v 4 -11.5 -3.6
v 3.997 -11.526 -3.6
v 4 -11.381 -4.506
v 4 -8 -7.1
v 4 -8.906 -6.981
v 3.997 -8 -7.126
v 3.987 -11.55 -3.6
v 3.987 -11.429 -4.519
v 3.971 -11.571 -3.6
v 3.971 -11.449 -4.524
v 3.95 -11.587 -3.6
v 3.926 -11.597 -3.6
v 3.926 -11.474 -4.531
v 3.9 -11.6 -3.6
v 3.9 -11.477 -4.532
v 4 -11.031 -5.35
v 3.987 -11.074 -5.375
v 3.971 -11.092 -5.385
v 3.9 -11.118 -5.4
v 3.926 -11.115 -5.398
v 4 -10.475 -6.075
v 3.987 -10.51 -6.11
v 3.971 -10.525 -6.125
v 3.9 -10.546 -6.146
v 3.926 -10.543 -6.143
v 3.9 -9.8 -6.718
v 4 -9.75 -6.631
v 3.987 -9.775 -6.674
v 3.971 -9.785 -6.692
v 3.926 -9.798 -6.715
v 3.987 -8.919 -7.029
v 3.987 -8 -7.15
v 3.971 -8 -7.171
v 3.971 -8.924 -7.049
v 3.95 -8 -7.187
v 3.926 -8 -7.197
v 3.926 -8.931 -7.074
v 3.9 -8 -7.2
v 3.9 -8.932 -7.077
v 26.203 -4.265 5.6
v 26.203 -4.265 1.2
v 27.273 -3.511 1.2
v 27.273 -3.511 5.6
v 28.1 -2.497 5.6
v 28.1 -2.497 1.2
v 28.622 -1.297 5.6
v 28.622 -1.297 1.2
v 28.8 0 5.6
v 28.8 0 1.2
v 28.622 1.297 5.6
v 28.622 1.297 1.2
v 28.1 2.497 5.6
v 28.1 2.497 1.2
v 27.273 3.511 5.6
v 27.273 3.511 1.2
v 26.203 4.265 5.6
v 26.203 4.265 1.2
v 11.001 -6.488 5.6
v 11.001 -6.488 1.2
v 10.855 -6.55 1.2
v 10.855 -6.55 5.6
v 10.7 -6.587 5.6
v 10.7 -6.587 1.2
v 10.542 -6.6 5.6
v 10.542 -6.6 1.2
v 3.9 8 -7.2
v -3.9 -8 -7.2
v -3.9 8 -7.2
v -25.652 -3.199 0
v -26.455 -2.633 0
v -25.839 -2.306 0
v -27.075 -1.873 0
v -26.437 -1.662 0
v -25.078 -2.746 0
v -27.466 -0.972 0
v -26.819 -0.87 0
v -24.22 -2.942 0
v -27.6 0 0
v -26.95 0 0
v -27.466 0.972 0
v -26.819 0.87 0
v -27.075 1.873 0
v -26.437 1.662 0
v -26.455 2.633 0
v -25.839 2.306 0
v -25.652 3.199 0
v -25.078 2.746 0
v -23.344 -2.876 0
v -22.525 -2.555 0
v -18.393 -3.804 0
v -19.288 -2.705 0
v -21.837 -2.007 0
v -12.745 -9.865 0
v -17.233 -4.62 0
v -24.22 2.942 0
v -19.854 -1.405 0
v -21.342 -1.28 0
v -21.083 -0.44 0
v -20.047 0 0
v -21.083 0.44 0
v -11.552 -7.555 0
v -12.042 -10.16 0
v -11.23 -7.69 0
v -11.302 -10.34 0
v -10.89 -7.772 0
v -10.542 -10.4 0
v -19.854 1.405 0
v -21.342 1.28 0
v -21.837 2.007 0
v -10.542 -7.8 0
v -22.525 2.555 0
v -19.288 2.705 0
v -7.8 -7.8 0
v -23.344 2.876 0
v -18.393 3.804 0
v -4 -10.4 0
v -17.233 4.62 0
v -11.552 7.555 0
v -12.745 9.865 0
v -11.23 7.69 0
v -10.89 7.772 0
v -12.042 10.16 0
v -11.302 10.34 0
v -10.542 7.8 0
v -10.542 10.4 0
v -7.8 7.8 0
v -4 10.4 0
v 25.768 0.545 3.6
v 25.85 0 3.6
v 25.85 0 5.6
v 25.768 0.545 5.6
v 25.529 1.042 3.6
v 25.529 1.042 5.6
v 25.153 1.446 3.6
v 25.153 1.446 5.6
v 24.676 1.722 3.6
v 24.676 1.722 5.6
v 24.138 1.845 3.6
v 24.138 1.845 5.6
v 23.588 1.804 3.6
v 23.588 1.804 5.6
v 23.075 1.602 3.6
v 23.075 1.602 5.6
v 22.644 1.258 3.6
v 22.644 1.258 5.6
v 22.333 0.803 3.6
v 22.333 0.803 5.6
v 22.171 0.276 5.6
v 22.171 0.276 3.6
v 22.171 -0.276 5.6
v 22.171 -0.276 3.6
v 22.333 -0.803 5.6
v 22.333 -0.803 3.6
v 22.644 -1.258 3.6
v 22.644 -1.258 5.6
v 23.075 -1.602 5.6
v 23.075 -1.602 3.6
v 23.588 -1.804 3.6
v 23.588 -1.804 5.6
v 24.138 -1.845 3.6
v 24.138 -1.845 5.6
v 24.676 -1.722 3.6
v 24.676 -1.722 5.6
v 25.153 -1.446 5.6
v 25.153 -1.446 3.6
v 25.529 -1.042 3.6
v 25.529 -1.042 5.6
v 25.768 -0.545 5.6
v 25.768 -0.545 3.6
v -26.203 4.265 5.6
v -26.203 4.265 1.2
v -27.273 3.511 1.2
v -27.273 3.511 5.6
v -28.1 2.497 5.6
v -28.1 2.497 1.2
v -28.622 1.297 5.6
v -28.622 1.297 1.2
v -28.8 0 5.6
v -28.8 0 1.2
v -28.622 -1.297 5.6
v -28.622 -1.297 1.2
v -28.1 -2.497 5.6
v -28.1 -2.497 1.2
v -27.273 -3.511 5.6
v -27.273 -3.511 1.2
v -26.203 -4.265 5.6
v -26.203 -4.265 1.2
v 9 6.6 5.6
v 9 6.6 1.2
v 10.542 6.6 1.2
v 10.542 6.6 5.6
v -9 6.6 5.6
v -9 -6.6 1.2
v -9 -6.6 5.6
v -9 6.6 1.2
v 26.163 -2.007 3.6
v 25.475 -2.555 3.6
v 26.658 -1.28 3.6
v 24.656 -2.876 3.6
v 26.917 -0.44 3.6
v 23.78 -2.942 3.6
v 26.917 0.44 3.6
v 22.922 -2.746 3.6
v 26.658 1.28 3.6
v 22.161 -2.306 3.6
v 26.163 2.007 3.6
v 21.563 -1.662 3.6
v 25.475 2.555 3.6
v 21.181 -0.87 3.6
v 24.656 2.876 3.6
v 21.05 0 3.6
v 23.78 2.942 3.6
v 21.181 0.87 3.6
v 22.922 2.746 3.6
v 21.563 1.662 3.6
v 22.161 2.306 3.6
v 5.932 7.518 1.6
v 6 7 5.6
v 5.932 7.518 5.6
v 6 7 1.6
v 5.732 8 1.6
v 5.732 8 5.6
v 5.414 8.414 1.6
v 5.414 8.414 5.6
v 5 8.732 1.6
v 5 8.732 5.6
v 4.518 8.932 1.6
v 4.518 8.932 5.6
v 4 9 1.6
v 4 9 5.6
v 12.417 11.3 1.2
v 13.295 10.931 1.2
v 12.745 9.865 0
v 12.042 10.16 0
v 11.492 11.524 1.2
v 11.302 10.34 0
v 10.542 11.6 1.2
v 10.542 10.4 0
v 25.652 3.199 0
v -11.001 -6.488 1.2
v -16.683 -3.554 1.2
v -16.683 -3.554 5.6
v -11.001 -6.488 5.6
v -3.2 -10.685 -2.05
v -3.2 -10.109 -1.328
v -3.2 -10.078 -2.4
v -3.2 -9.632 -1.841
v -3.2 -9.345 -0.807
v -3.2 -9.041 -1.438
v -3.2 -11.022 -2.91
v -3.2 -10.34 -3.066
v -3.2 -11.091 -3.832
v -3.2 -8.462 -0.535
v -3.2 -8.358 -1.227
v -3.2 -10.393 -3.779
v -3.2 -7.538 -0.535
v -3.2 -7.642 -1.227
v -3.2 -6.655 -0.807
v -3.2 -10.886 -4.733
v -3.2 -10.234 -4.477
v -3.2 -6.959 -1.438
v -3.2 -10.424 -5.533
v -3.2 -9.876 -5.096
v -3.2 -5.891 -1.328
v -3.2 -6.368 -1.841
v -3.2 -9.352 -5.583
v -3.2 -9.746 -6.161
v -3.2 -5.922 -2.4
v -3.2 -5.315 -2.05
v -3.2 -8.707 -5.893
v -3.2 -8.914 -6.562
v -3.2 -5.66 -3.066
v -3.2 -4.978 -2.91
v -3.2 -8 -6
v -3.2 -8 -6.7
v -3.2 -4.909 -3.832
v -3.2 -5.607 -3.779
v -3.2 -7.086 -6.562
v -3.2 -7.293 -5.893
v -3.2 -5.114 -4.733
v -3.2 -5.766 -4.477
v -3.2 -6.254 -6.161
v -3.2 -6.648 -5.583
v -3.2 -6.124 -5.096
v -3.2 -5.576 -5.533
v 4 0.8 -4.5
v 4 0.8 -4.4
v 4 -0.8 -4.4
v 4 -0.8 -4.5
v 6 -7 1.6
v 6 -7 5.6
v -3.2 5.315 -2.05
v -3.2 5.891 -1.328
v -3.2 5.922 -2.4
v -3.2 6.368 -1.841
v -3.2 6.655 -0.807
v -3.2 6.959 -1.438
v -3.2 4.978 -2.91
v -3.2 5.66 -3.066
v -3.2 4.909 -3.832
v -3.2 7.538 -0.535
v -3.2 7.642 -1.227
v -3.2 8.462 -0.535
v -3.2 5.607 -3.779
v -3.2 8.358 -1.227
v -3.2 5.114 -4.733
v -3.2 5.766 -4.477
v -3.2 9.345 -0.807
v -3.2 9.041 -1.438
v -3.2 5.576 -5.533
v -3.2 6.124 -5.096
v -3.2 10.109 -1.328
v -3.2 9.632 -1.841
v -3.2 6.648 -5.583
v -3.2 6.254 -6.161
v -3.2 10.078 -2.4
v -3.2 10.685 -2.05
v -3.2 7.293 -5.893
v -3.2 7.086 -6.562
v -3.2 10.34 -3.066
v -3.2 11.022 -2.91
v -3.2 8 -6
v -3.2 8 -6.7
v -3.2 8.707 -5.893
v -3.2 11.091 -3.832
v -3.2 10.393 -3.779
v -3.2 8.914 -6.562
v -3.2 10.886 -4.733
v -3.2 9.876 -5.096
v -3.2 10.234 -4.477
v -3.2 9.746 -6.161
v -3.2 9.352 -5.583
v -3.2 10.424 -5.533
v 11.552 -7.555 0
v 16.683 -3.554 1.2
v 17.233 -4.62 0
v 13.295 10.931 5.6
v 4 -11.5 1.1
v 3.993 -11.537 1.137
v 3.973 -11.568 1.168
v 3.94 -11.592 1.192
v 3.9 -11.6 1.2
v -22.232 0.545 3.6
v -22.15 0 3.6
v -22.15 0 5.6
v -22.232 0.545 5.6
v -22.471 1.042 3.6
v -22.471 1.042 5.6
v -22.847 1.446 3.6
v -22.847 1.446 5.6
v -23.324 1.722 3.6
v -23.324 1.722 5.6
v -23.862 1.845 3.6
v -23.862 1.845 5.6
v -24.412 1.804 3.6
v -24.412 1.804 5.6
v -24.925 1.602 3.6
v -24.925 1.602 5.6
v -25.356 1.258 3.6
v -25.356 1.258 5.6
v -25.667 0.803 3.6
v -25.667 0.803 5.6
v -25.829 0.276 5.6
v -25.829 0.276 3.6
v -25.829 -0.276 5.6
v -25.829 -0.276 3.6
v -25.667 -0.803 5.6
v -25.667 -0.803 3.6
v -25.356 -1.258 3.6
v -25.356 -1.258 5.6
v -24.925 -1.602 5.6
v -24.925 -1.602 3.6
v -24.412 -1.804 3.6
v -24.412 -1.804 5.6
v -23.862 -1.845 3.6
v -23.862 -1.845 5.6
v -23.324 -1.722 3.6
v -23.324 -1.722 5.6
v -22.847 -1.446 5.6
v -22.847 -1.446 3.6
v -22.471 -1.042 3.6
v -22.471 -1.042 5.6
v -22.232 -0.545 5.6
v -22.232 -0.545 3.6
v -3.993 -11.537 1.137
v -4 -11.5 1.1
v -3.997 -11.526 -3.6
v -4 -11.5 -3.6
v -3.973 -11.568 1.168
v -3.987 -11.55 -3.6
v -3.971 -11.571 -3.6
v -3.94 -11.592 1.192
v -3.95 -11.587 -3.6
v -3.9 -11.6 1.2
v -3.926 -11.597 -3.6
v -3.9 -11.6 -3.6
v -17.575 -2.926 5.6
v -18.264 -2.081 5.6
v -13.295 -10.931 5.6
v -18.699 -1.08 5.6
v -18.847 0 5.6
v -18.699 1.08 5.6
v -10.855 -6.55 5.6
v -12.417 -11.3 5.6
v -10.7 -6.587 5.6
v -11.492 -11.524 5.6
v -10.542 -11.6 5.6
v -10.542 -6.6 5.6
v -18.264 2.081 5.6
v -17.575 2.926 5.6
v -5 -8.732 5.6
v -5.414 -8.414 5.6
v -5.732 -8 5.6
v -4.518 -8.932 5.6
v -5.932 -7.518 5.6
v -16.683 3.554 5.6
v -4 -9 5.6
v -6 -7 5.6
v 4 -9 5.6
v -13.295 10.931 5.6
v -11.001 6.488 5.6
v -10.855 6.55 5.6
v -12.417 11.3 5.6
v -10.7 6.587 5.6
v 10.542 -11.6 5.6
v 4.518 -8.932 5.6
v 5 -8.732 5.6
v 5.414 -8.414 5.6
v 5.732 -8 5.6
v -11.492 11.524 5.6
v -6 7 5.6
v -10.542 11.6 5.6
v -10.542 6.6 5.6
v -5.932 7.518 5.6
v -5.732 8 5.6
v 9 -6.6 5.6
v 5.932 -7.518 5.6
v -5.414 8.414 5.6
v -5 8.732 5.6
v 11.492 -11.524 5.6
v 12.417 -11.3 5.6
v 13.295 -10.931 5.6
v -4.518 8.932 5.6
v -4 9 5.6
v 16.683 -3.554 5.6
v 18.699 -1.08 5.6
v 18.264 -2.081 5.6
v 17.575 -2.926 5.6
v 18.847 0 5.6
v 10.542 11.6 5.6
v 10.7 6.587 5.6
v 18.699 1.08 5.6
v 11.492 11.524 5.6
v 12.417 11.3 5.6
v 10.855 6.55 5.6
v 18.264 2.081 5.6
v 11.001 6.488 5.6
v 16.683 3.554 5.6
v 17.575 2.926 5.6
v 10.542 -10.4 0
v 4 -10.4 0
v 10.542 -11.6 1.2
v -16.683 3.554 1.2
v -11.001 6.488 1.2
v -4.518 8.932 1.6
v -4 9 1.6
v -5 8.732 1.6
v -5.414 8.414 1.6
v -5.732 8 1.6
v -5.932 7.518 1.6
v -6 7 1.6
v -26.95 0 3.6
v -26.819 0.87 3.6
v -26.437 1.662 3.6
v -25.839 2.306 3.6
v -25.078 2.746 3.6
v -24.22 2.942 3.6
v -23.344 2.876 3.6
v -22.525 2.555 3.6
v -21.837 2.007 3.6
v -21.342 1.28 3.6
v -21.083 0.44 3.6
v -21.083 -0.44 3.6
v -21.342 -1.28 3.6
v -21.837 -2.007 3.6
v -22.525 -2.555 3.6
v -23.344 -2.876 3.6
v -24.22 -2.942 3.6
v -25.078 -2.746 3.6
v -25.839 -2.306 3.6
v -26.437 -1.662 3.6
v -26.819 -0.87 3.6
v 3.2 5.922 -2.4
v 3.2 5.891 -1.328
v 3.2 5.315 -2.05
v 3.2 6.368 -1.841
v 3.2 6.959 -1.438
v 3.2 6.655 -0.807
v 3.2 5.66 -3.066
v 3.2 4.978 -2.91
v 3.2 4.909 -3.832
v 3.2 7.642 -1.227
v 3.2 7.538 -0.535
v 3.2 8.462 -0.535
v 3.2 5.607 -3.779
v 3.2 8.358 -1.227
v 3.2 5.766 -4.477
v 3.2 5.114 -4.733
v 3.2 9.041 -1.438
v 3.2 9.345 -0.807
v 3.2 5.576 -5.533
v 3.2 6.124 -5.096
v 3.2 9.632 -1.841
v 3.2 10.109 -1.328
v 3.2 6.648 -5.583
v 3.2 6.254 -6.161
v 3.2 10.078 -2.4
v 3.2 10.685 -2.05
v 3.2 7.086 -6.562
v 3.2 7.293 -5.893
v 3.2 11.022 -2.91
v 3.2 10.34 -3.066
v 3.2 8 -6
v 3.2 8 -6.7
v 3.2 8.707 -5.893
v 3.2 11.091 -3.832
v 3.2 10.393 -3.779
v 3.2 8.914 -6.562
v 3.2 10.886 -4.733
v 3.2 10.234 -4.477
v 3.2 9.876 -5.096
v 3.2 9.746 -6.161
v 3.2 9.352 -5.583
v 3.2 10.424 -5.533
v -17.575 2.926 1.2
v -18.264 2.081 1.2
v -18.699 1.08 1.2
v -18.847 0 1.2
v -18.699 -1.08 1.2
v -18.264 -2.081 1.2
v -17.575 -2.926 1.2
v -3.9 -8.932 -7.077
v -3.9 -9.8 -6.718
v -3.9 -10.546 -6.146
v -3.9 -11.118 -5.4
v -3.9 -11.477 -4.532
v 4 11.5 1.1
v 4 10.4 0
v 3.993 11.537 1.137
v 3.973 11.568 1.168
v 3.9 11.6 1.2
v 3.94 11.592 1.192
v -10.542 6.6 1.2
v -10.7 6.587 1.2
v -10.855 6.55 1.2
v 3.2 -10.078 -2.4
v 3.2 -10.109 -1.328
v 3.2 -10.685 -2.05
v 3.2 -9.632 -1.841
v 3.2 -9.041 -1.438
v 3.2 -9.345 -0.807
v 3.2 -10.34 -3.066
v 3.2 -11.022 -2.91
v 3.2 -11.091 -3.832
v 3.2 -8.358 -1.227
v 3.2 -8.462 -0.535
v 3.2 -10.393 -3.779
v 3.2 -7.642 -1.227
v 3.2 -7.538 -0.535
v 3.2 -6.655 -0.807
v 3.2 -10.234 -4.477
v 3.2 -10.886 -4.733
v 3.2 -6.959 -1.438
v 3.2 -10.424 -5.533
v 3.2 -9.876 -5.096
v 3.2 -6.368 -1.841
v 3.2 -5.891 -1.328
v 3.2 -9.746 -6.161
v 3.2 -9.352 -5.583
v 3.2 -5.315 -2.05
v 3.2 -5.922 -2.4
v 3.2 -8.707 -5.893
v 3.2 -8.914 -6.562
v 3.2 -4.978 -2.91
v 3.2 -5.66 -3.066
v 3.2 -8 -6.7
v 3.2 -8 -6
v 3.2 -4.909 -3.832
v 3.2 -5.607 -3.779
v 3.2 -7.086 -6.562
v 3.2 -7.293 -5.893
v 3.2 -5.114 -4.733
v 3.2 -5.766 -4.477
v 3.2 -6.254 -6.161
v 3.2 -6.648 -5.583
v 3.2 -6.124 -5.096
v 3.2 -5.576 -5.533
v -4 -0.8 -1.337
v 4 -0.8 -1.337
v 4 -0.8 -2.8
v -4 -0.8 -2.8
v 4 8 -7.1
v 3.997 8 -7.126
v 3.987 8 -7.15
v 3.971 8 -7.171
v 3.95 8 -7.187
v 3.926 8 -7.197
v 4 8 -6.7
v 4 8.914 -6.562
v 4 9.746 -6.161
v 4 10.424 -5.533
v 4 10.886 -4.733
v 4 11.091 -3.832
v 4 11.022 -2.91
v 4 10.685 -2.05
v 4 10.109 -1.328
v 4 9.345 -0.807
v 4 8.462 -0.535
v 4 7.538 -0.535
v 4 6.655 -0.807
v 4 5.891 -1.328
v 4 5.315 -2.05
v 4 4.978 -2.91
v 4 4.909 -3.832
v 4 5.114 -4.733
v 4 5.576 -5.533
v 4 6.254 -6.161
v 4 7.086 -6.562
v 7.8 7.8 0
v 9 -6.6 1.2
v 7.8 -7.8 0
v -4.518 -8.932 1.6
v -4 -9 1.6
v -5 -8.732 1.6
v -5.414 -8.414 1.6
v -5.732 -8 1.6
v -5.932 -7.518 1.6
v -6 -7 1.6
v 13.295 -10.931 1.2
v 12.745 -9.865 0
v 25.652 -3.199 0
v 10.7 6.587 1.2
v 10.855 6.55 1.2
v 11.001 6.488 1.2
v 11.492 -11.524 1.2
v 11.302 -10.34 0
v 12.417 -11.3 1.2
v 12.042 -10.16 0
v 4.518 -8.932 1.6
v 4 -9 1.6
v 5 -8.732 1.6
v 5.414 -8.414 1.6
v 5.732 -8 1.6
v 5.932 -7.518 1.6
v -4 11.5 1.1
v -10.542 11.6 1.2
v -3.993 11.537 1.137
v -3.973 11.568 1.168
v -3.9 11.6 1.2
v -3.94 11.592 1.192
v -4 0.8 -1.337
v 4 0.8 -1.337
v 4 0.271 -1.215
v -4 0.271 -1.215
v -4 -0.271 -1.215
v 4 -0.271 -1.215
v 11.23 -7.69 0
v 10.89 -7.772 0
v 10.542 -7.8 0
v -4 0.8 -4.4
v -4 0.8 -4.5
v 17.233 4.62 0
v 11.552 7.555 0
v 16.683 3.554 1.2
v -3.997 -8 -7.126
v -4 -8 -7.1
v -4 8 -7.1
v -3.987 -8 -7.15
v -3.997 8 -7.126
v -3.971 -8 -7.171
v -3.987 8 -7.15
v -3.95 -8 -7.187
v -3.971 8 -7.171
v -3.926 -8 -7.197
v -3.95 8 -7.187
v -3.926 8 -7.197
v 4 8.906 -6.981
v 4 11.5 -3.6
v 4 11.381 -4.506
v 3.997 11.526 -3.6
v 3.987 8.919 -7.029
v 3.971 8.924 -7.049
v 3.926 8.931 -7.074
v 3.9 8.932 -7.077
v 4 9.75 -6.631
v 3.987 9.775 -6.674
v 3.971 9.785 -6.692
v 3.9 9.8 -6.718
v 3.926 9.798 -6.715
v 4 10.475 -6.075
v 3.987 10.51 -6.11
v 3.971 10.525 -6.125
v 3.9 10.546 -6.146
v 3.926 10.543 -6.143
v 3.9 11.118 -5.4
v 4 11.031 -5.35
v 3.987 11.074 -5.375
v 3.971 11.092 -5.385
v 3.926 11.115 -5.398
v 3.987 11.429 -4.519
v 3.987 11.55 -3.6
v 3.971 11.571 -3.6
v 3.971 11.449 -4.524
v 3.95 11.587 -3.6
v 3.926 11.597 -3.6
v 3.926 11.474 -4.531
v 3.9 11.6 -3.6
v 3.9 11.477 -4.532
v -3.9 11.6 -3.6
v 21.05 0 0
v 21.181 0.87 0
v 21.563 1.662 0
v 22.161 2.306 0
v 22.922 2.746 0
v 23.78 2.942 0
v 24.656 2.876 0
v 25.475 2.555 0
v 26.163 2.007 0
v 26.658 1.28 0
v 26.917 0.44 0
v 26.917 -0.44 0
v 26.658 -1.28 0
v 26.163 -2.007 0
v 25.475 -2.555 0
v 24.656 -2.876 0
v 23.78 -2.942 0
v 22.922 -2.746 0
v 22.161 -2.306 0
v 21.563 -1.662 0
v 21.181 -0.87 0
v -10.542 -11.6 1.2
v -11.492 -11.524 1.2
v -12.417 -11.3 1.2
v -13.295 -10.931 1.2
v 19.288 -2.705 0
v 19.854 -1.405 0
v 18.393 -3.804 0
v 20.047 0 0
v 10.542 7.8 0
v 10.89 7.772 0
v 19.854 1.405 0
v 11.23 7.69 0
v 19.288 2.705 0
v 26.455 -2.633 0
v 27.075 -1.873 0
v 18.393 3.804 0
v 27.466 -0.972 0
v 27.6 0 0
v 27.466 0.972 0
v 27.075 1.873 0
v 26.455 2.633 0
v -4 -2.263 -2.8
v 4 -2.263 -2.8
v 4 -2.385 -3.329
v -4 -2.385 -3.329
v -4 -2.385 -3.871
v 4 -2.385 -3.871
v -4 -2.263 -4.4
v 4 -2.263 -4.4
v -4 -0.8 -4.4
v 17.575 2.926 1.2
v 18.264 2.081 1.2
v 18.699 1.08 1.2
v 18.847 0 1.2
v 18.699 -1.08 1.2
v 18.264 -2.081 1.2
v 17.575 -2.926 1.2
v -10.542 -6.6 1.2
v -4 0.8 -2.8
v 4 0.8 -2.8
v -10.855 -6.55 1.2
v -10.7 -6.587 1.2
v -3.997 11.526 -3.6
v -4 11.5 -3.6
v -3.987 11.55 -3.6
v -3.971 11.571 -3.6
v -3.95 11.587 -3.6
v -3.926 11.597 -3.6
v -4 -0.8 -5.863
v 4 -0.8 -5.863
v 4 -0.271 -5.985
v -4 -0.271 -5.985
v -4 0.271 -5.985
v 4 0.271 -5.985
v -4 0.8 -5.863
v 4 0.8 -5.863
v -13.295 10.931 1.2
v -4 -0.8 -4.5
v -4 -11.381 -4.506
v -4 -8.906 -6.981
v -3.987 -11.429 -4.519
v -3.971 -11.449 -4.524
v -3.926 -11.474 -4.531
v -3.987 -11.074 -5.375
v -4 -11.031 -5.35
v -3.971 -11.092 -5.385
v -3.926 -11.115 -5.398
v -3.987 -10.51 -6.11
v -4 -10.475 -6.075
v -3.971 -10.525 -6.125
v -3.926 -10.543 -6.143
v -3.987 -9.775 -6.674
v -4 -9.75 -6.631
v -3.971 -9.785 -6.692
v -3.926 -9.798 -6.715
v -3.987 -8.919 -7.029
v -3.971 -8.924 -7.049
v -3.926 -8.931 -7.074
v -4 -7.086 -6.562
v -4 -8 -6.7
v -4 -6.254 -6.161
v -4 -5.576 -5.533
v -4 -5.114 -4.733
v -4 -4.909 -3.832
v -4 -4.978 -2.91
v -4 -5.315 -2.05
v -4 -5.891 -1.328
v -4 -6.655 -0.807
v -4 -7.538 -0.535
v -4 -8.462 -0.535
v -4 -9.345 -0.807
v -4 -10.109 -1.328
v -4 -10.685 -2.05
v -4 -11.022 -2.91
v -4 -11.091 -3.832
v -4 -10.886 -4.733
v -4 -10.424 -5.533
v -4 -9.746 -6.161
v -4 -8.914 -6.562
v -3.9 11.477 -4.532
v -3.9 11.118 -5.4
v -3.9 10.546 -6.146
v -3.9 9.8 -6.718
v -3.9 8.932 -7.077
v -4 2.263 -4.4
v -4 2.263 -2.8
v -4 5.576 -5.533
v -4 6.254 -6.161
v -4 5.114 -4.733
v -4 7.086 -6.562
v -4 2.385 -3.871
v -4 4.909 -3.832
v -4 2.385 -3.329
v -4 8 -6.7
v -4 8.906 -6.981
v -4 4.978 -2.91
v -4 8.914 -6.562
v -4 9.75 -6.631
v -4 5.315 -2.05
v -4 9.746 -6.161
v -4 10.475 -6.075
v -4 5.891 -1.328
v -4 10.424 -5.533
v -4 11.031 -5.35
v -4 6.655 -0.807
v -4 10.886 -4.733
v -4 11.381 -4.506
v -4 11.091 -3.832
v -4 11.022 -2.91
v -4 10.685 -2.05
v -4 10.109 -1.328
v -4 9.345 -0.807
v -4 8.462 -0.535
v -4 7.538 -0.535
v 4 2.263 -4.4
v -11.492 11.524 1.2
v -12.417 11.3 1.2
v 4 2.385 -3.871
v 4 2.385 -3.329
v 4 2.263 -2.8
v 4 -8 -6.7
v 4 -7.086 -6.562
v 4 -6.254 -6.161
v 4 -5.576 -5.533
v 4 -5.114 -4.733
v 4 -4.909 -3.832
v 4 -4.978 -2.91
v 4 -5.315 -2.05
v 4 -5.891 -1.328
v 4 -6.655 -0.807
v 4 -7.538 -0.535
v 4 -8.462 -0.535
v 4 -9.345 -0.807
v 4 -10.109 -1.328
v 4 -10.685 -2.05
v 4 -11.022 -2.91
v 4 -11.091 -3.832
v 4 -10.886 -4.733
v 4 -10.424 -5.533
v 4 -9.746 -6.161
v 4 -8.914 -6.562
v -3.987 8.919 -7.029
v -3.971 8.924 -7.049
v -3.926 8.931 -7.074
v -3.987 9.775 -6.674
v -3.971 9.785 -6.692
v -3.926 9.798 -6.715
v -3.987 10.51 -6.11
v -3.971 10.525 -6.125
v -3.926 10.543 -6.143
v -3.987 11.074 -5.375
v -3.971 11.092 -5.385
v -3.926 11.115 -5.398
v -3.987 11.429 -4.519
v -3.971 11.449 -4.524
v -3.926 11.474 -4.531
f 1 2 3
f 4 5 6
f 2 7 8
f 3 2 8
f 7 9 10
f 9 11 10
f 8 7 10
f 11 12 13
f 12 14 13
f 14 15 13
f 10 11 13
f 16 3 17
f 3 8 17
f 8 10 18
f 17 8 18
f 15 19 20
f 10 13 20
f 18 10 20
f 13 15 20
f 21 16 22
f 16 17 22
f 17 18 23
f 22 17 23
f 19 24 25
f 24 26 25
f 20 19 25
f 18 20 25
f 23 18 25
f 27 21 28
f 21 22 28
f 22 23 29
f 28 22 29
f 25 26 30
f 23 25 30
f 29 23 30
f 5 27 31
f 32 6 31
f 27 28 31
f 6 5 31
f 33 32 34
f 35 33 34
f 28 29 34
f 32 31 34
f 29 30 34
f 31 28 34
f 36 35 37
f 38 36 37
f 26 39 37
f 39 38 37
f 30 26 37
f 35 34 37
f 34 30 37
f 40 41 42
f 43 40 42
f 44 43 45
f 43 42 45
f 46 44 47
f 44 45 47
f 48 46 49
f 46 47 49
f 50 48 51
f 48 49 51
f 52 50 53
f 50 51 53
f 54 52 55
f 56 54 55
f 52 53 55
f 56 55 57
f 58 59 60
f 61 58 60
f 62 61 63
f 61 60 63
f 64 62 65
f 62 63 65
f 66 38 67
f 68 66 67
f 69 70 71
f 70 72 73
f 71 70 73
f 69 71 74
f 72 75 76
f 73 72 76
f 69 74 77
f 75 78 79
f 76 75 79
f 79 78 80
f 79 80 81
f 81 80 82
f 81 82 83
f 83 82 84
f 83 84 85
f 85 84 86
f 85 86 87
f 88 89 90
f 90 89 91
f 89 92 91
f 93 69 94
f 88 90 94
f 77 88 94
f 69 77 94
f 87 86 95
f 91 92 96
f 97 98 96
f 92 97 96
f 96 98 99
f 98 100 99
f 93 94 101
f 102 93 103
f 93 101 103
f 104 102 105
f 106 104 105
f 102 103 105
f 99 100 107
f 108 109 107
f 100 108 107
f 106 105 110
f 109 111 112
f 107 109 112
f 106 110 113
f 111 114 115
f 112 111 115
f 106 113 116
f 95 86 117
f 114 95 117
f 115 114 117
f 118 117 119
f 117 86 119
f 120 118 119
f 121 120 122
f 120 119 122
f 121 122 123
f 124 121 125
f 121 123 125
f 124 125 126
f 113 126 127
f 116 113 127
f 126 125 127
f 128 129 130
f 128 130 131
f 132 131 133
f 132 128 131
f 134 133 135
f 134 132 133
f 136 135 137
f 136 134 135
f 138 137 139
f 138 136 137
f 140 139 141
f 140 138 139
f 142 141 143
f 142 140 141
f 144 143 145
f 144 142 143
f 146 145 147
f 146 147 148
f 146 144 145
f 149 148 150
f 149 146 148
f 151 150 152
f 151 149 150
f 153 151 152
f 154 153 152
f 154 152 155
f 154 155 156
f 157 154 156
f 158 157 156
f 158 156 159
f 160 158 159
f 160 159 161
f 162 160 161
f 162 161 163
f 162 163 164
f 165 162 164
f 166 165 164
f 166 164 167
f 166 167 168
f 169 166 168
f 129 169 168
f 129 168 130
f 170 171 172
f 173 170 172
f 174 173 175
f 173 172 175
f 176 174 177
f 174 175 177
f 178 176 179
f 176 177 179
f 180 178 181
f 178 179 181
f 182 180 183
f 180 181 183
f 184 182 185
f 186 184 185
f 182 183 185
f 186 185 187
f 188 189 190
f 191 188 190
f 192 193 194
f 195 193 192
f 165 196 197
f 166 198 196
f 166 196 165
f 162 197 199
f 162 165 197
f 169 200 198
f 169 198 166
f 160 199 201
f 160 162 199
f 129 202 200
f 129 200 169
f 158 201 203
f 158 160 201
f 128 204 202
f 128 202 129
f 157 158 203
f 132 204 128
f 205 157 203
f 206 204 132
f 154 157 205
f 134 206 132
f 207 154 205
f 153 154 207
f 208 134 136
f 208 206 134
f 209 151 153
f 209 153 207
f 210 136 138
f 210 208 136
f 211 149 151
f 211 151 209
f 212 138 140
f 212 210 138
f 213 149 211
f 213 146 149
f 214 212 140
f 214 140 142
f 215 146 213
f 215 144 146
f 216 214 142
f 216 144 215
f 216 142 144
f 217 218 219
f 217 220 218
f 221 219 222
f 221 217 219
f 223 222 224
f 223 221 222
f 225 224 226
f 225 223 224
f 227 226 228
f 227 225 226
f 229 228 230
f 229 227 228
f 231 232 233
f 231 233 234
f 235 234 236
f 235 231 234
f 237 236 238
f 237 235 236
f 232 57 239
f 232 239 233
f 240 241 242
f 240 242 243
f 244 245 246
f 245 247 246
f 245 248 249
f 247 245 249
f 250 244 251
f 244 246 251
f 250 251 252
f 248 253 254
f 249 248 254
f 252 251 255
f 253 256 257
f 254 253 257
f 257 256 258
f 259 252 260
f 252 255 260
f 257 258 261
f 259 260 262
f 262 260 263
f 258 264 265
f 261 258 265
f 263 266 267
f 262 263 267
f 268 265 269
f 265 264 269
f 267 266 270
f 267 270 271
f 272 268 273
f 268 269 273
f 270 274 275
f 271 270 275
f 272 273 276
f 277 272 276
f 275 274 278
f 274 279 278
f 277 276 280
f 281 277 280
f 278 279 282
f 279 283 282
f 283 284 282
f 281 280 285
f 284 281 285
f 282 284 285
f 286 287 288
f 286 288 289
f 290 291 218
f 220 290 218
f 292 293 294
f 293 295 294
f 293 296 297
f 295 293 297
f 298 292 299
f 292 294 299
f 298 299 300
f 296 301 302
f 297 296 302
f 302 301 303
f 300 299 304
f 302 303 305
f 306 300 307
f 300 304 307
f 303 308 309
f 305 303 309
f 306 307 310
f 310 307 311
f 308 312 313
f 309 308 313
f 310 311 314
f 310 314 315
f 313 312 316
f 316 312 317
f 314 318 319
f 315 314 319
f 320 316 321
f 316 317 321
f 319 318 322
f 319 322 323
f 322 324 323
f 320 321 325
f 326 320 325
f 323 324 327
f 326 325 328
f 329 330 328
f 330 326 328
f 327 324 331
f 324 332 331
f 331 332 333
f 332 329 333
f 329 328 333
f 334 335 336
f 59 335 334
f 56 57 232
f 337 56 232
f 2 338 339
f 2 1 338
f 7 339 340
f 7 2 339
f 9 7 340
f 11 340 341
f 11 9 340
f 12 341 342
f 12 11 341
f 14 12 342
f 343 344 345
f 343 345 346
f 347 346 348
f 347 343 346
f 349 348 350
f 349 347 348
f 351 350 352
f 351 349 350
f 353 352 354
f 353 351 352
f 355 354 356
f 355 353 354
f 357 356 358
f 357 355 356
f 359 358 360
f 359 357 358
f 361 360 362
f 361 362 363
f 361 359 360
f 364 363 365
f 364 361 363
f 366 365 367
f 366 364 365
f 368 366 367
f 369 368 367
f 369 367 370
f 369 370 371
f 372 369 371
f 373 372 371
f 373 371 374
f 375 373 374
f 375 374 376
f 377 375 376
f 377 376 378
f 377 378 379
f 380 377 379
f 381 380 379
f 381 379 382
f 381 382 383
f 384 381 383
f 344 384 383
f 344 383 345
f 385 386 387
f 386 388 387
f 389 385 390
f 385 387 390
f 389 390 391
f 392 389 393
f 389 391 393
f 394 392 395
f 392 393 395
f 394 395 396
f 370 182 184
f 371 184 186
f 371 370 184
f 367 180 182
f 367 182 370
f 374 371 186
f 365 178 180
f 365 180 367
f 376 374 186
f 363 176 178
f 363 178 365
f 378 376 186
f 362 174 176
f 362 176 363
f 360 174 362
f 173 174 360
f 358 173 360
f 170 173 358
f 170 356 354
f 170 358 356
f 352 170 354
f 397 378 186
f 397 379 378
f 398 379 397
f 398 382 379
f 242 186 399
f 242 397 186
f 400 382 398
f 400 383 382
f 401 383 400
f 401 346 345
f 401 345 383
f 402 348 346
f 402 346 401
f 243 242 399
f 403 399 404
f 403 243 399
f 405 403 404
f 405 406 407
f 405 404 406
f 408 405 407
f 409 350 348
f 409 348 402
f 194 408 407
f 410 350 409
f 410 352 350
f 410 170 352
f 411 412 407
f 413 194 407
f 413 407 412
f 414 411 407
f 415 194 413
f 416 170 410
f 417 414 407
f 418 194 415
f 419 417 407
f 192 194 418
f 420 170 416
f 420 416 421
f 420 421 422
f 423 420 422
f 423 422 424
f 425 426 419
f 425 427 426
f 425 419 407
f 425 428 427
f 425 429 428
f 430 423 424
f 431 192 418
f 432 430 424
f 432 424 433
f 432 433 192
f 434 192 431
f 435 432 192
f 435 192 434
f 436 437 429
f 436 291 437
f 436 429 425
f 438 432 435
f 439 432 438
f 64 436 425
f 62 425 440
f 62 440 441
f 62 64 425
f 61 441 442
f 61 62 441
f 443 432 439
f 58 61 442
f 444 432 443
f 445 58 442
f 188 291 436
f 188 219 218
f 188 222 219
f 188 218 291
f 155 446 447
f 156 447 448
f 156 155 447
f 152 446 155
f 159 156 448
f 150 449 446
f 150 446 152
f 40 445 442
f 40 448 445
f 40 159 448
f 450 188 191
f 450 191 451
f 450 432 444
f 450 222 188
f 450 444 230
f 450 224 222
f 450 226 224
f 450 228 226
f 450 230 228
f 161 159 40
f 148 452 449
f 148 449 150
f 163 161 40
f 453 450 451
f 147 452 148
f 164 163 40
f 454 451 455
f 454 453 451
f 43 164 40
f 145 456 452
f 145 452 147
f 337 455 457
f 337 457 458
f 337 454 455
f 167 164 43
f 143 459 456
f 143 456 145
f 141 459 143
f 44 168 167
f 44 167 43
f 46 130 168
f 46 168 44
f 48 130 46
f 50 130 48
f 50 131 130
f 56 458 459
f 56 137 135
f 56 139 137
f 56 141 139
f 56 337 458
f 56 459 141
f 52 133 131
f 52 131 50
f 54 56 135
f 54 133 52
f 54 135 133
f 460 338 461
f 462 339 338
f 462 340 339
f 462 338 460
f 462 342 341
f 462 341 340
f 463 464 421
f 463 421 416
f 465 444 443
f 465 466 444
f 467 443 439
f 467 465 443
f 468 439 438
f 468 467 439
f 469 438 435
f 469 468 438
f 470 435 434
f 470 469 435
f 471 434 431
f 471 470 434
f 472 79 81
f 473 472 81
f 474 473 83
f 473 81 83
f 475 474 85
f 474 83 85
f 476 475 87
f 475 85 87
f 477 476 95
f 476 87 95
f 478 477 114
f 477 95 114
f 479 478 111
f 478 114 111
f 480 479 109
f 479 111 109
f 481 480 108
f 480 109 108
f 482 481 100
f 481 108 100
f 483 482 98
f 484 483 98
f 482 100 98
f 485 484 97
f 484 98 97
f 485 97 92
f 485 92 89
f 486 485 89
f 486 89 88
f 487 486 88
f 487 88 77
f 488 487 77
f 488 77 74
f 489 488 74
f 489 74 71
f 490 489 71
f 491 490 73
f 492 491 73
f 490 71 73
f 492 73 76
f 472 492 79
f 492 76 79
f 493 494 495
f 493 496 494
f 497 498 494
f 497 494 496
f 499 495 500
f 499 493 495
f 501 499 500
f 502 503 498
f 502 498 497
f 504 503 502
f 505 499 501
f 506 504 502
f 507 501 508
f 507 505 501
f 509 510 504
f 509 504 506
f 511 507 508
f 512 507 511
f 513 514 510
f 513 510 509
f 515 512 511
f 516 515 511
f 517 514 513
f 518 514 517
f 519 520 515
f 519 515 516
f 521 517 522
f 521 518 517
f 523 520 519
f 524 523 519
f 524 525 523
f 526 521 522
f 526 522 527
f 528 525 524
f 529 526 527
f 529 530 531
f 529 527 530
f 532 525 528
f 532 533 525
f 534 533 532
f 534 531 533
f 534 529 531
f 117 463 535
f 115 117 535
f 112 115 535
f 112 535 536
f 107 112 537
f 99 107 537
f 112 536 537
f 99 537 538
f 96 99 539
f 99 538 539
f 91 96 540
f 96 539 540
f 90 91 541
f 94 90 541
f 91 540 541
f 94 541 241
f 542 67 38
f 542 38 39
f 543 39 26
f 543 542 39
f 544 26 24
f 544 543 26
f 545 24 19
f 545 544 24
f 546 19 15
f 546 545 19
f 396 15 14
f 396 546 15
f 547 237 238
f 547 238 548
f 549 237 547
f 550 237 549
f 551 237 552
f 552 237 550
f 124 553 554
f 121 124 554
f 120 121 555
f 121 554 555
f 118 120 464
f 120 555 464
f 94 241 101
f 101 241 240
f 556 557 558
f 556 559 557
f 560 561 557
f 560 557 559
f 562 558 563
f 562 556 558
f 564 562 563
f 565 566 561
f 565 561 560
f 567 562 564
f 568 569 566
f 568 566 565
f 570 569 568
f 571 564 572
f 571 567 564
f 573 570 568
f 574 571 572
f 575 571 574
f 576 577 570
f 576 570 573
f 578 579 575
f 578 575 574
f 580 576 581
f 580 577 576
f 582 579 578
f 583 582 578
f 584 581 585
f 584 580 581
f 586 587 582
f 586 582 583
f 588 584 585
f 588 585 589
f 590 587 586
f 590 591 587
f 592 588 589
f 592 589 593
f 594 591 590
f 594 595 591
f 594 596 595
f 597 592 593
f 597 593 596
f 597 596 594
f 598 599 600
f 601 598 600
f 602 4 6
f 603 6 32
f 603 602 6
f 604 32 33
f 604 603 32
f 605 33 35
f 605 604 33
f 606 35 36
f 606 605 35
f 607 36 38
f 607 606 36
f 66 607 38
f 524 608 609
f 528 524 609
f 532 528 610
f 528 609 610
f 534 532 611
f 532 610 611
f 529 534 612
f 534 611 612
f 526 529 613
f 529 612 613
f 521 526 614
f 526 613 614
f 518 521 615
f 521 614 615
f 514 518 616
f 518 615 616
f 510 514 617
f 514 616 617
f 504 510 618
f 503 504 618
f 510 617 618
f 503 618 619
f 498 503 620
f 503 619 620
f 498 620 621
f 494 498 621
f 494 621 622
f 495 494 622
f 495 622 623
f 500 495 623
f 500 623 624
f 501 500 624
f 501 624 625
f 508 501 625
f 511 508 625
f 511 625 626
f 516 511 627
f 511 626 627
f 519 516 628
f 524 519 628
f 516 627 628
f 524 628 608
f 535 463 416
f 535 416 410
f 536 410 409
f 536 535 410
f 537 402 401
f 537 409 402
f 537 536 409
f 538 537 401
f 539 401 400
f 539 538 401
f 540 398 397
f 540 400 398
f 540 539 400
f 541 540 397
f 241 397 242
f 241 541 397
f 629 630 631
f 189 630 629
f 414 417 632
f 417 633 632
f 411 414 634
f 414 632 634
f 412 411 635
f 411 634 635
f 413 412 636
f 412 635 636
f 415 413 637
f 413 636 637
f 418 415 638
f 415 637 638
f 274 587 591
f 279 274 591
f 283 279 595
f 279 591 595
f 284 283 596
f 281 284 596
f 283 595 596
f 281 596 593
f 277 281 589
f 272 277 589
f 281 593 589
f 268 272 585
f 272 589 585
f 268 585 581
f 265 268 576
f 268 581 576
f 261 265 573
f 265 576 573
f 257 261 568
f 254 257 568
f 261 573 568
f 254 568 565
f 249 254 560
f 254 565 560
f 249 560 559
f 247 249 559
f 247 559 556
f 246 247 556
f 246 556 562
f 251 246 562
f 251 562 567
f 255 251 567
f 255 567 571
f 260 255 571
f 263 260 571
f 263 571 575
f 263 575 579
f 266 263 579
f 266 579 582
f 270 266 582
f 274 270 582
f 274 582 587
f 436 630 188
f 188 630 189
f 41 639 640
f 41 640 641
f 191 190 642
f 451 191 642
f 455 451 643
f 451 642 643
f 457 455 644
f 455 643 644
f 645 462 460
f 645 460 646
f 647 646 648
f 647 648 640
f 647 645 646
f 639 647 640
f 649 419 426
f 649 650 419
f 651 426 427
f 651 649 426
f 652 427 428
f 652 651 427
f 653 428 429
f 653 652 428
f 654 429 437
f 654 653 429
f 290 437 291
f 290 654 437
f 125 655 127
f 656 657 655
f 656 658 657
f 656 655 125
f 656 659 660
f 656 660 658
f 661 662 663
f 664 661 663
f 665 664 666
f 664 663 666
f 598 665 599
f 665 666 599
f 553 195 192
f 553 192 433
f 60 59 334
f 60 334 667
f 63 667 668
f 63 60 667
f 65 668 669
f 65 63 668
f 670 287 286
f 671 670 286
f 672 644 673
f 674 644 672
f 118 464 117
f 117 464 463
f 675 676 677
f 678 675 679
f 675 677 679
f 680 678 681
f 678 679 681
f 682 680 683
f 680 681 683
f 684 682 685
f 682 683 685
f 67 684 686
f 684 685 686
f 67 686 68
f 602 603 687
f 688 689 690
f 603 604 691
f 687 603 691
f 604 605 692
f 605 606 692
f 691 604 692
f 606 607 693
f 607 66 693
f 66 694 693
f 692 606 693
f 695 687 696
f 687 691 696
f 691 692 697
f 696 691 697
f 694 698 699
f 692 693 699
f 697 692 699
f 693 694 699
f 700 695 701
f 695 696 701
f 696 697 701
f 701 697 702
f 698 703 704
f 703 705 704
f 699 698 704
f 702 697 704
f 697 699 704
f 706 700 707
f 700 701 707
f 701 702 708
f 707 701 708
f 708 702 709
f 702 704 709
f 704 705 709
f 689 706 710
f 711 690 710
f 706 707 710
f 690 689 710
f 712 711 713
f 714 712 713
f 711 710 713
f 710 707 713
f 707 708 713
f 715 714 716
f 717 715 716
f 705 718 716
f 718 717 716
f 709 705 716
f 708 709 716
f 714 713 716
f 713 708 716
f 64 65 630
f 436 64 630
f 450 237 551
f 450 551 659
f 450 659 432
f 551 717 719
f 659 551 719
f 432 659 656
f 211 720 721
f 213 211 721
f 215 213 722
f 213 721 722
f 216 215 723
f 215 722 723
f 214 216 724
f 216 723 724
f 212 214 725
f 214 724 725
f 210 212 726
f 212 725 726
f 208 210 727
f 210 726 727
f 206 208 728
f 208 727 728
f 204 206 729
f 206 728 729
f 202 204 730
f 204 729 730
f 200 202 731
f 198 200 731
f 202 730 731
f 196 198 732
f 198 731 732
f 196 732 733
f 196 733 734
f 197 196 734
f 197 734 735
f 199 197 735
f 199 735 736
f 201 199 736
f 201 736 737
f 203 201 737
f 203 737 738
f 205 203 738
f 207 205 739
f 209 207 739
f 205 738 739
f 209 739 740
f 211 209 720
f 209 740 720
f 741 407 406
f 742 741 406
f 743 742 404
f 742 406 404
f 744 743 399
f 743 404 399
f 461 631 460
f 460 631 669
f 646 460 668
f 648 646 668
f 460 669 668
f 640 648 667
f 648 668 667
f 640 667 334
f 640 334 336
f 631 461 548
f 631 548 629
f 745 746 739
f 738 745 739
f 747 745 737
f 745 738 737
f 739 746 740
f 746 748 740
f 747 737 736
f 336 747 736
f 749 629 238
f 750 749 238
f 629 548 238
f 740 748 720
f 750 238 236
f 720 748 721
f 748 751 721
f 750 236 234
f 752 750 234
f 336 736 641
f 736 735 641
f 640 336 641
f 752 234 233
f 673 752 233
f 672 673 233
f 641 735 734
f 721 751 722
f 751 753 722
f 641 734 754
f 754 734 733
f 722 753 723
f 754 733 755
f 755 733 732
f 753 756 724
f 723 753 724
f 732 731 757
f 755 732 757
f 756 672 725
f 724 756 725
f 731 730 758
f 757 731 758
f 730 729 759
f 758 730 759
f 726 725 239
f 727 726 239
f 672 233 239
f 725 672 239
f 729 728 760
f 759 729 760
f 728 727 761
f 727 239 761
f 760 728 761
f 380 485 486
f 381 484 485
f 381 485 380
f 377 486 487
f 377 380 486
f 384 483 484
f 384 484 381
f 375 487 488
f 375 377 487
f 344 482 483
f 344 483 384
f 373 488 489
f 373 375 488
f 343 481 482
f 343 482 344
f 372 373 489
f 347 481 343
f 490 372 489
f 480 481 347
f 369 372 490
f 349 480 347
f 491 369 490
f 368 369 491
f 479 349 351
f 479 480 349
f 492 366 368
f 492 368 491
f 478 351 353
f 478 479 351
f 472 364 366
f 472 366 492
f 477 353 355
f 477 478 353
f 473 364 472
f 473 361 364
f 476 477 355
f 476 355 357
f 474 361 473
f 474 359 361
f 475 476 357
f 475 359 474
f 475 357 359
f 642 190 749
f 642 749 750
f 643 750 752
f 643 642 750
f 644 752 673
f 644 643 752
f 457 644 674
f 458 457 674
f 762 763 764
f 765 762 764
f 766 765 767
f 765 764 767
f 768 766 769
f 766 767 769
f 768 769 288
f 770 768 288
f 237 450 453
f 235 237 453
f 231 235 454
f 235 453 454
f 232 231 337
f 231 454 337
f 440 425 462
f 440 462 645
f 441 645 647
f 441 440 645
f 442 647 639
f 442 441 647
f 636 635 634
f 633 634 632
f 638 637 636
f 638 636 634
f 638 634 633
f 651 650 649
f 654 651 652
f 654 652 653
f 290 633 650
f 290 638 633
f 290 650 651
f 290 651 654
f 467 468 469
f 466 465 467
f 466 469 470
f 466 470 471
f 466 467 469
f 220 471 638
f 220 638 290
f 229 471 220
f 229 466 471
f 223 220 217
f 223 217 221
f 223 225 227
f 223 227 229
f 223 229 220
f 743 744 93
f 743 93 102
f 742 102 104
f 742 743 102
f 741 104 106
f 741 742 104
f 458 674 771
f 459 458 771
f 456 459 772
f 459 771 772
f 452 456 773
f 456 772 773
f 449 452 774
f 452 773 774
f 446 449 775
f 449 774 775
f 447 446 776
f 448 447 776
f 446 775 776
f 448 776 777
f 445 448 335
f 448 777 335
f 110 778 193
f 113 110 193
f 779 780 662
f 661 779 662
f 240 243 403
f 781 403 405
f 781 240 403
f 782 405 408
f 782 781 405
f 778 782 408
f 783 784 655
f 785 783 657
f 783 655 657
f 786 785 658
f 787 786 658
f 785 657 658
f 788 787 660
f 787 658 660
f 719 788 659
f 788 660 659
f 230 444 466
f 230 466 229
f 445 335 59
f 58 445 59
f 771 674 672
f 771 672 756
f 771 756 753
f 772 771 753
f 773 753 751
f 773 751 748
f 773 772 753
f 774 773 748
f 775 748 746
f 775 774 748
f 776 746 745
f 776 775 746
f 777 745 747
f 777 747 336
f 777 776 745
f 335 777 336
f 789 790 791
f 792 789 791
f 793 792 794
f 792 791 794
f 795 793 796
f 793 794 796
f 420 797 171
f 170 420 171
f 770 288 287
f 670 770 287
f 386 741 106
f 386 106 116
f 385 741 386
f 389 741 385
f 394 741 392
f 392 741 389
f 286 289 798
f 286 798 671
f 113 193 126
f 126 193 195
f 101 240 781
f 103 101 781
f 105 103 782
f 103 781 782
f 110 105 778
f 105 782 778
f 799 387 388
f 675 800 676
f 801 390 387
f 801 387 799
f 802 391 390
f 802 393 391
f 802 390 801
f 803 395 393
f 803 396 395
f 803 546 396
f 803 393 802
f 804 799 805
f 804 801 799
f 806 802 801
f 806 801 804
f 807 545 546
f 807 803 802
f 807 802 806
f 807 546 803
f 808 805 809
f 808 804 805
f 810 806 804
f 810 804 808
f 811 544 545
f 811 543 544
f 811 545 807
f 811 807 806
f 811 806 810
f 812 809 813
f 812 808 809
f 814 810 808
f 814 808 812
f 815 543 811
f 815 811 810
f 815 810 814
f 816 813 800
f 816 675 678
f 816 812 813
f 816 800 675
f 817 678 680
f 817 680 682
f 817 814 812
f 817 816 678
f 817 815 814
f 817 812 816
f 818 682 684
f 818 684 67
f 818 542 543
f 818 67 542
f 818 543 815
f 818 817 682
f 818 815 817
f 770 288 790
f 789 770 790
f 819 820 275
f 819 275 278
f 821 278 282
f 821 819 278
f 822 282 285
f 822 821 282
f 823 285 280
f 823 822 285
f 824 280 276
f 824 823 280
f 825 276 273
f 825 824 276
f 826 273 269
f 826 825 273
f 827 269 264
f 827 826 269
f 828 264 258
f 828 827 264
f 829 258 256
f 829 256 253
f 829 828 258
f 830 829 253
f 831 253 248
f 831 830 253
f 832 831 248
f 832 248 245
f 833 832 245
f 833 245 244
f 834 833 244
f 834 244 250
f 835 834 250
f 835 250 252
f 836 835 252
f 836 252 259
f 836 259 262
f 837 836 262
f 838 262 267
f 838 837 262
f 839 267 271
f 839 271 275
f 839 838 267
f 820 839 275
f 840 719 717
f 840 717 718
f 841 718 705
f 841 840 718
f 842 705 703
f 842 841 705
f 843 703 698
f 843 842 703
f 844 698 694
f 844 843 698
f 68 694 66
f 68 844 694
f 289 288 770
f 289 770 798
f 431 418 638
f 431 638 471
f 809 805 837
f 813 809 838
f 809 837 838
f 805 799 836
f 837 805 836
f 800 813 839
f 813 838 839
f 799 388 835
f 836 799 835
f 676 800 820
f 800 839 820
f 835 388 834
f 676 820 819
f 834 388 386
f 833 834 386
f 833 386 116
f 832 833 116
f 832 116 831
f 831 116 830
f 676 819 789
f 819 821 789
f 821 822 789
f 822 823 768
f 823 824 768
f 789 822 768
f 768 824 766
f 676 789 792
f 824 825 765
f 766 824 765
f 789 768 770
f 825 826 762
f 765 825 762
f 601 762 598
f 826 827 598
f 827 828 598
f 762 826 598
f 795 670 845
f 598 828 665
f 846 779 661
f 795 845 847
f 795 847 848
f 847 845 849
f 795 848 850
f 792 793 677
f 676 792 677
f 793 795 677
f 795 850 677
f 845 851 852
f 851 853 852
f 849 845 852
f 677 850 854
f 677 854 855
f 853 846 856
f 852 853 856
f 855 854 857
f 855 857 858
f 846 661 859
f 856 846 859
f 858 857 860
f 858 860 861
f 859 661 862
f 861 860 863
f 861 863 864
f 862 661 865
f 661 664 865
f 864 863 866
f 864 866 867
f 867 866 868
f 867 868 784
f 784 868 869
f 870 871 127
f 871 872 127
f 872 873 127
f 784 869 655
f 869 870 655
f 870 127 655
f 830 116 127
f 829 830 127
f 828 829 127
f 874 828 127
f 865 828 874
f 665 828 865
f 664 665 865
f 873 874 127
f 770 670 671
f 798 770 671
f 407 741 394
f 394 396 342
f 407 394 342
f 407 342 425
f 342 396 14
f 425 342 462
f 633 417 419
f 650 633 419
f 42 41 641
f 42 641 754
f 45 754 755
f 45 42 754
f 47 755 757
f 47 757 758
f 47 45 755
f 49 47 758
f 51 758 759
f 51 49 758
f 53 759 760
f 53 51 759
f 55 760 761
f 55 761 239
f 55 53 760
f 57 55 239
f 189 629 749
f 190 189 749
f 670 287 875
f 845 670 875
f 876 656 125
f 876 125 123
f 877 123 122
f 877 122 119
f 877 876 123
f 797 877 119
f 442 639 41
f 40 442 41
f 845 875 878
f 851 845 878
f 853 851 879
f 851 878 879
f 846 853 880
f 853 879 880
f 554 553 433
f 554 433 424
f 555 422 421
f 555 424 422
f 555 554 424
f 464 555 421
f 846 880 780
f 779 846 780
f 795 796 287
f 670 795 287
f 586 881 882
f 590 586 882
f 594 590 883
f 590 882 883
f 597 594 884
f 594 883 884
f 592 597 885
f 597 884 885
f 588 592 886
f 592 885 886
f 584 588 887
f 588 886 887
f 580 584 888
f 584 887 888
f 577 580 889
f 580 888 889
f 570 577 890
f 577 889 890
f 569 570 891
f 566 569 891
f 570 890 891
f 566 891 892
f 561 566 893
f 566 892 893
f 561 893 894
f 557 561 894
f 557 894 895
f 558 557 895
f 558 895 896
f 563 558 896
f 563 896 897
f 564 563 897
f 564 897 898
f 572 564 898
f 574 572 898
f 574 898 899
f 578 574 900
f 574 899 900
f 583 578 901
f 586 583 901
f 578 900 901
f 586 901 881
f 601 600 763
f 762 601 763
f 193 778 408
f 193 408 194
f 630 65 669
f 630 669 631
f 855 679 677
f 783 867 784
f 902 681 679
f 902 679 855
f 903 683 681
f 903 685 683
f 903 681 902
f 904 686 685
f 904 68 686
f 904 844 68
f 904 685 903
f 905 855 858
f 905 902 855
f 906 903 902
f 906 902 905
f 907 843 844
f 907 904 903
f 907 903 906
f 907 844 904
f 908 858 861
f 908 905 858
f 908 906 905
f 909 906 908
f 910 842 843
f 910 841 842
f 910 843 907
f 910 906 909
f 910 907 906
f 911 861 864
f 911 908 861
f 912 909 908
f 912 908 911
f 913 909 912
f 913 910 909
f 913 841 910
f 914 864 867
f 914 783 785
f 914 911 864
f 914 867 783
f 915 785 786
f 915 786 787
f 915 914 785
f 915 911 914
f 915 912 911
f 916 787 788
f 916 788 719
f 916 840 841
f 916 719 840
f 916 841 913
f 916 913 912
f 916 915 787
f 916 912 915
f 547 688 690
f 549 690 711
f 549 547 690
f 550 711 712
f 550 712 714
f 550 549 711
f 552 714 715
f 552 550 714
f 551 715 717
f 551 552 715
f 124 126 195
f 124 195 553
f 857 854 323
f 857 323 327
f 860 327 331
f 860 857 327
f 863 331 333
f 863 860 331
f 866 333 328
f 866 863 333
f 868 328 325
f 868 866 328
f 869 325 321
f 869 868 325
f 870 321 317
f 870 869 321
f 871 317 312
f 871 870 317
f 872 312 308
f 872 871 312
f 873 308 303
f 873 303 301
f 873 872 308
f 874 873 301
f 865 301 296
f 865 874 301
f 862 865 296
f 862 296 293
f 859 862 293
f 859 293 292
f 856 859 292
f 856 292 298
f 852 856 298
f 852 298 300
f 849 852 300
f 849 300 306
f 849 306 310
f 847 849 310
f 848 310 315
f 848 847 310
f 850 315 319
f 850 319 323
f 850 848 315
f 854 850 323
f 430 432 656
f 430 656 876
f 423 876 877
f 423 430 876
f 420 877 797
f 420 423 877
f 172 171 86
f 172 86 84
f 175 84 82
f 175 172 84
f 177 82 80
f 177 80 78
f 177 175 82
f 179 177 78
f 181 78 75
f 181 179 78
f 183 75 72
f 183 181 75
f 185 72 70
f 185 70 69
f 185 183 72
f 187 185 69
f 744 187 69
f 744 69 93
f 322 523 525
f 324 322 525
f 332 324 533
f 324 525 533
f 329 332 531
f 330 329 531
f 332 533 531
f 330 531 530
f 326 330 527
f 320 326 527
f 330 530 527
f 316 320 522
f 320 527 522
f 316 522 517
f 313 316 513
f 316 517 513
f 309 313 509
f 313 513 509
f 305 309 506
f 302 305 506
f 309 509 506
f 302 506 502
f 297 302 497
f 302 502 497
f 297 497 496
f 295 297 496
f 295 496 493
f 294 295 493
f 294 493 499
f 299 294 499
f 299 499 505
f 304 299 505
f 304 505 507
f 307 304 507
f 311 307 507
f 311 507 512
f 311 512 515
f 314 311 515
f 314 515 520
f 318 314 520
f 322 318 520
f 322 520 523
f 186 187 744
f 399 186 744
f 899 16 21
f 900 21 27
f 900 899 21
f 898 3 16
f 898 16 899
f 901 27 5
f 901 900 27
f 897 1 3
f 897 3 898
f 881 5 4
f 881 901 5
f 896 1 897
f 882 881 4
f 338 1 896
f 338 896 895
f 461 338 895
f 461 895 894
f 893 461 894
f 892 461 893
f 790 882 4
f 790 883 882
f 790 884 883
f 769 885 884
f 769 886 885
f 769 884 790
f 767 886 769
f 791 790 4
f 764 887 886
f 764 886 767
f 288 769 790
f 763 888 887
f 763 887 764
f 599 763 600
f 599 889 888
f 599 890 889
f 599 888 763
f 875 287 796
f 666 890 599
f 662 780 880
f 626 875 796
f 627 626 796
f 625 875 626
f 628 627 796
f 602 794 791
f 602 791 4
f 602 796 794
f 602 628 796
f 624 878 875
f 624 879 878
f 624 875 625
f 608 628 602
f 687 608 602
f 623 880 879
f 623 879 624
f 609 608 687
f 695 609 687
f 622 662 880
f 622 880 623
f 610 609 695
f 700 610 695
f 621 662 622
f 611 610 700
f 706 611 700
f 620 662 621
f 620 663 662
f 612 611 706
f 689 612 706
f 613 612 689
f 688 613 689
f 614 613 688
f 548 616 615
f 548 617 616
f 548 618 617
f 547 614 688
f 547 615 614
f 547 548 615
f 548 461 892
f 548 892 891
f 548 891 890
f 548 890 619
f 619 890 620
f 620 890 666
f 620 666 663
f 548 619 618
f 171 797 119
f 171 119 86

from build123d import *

# Parameters (mm, degrees)
SKETCH_2_R          = 1.85
EXTRUDE_1_DEPTH     = 5.6
SKETCH_3_R          = 2.95
CUT_EXTRUDE_1_DEPTH = 3.6
SKETCH_4_W          = 8
SKETCH_4_H          = 23.2
EXTRUDE_2_DEPTH     = 7.2
SKETCH_5_R          = 2.4
CUT_EXTRUDE_2_DEPTH = 33.8
FILLET_1_R          = 3.6
SKETCH_6_R          = 3.1
CUT_EXTRUDE_3_DEPTH = 0.8
FILLET_2_R          = 6
CUT_EXTRUDE_4_DEPTH = 6.6
CHAMFER_1_SIZE      = 1.2
SKETCH_8_W          = 12
SKETCH_8_H          = 18
CUT_EXTRUDE_5_DEPTH = 4
FILLET_3_R          = 2
FILLET_4_R          = 0.1
SKETCH_9_W          = 0.1
SKETCH_9_H          = 1.6
EXTRUDE_3_DEPTH     = 8


with BuildPart() as part:
    # ｽｹｯﾁ2 → ﾎﾞｽ - 押し出し1 (new body)
    with BuildSketch(Plane.XY):
        with BuildLine():
            Line((-12, 11.6), (-26.202629265, 4.264788895))
            ThreePointArc((-26.202629265, 4.264788895), (-28.8, 0), (-26.202629265, -4.264788895))
            Line((-26.202629265, -4.264788895), (-12, -11.6))
            Line((-12, -11.6), (12, -11.6))
            Line((12, -11.6), (26.202629265, -4.264788895))
            ThreePointArc((26.202629265, -4.264788895), (28.8, 0), (26.202629265, 4.264788895))
            Line((26.202629265, 4.264788895), (12, 11.6))
            Line((12, 11.6), (-12, 11.6))
        make_face()
        with Locations((-24, 0)):
            Circle(SKETCH_2_R, mode=Mode.SUBTRACT)
        with Locations((24, 0)):
            Circle(SKETCH_2_R, mode=Mode.SUBTRACT)
    extrude(amount=EXTRUDE_1_DEPTH)

    # ｽｹｯﾁ3 → ｶｯﾄ - 押し出し1 (cut)
    with BuildSketch(Plane(origin=(0, 0, 0), x_dir=(-1, 0, 0), z_dir=(0, 0, -1))):
        with Locations((-24, 0)):
            Circle(SKETCH_3_R)
        with Locations((24, 0)):
            Circle(SKETCH_3_R)
    extrude(amount=-CUT_EXTRUDE_1_DEPTH, mode=Mode.SUBTRACT)

    # ｽｹｯﾁ4 → ﾎﾞｽ - 押し出し2 (add)
    with BuildSketch(Plane(origin=(0, 0, 0), x_dir=(-1, 0, 0), z_dir=(0, 0, -1))):
        Rectangle(SKETCH_4_W, SKETCH_4_H)
    extrude(amount=EXTRUDE_2_DEPTH)

    # ｽｹｯﾁ5 → ｶｯﾄ - 押し出し2 (cut, through all)
    with BuildSketch(Plane(origin=(4, 0, 0), x_dir=(0, 0, -1), z_dir=(1, 0, 0))):
        with Locations((3.6, 8)):
            Circle(SKETCH_5_R)
        with Locations((3.6, -8)):
            Circle(SKETCH_5_R)
        with BuildLine():
            Line((2.8, 2.2627417), (2.8, 0.8))
            Line((2.8, 0.8), (1.3372583, 0.8))
            ThreePointArc((1.3372583, 0.8), (1.2, 0), (1.3372583, -0.8))
            Line((1.3372583, -0.8), (2.8, -0.8))
            Line((2.8, -0.8), (2.8, -2.2627417))
            ThreePointArc((2.8, -2.2627417), (3.6, -2.4), (4.4, -2.2627417))
            Line((4.4, -2.2627417), (4.4, -0.8))
            Line((4.4, -0.8), (5.8627417, -0.8))
            ThreePointArc((5.8627417, -0.8), (6, 0), (5.8627417, 0.8))
            Line((5.8627417, 0.8), (4.4, 0.8))
            Line((4.4, 0.8), (4.4, 2.2627417))
            ThreePointArc((4.4, 2.2627417), (3.6, 2.4), (2.8, 2.2627417))
        make_face()
    extrude(amount=-CUT_EXTRUDE_2_DEPTH, mode=Mode.SUBTRACT)

    # ﾌｨﾚｯﾄ1
    fillet_1_edges = [part.edges().sort_by_distance(p)[0] for p in [
        (0, -11.6, -7.2),
        (0, 11.6, -7.2),
    ]]
    fillet(fillet_1_edges, radius=FILLET_1_R)

    # ｽｹｯﾁ6 → ｶｯﾄ - 押し出し3 (cut)
    with BuildSketch(Plane(origin=(4, 0, 0), x_dir=(0, 0, -1), z_dir=(1, 0, 0))):
        with Locations((3.6, 8)):
            Circle(SKETCH_6_R)
        with Locations((3.6, -8)):
            Circle(SKETCH_6_R)
    cut_extrude_3 = extrude(amount=-CUT_EXTRUDE_3_DEPTH, mode=Mode.SUBTRACT)

    # ﾐﾗｰ1: ｶｯﾄ - 押し出し3 across plane
    add(cut_extrude_3.mirror(Plane(origin=(0, 0, 0), x_dir=(0, 0, 1), z_dir=(1, 0, 0))), mode=Mode.SUBTRACT)

    # ﾌｨﾚｯﾄ2
    fillet_2_edges = [part.edges().sort_by_distance(p)[0] for p in [
        (12, 11.6, 2.8),
        (12, -11.6, 2.8),
        (-12, -11.6, 2.8),
        (-12, 11.6, 2.8),
    ]]
    fillet(fillet_2_edges, radius=FILLET_2_R)

    # ｽｹｯﾁ7 → ｶｯﾄ - 押し出し4 (cut, through all)
    with BuildSketch(Plane(origin=(0, 0, 0), x_dir=(-1, 0, 0), z_dir=(0, 0, -1))):
        with BuildLine():
            Line((-16.682826602, -3.553990746), (-11.000956842, -6.488497686))
            ThreePointArc((-11.000956842, -6.488497686), (-10.778192574, -6.571724675), (-10.542075746, -6.6))
            Line((-10.542075746, -6.6), (-9, -6.6))
            Line((-9, -6.6), (-9, 6.6))
            Line((-9, 6.6), (-10.542075746, 6.6))
            ThreePointArc((-10.542075746, 6.6), (-10.778192574, 6.571724675), (-11.000956842, 6.488497686))
            Line((-11.000956842, 6.488497686), (-16.682826602, 3.553990746))
            ThreePointArc((-16.682826602, 3.553990746), (-18.847302214, 0), (-16.682826602, -3.553990746))
        make_face()
    cut_extrude_4 = extrude(amount=-CUT_EXTRUDE_4_DEPTH, mode=Mode.SUBTRACT)

    # ﾐﾗｰ2: ｶｯﾄ - 押し出し4 across plane
    add(cut_extrude_4.mirror(Plane(origin=(0, 0, 0), x_dir=(0, 0, 1), z_dir=(1, 0, 0))), mode=Mode.SUBTRACT)

    # 面取り1
    chamfer_1_edges = [part.edges().sort_by_distance(p)[0] for p in [
        (-19.748995796, -7.597887507, 0),
        (-28.8, 0, 0),
        (-7.271037873, -11.6, 0),
        (-19.748995796, 7.597887507, 0),
        (-11.958776717, 11.430348048, 0),
        (-11.958776717, -11.430348048, 0),
        (19.748995796, -7.597887507, 0),
        (7.271037873, 11.6, 0),
        (11.958776717, 11.430348048, 0),
        (11.958776717, -11.430348048, 0),
        (18.847302214, 0, 0),
        (13.841891722, -5.021244216, 0),
        (10.778192574, -6.571724675, 0),
        (9.771037873, -6.6, 0),
        (9, 0, 0),
        (9.771037873, 6.6, 0),
        (10.778192574, 6.571724675, 0),
        (13.841891722, 5.021244216, 0),
        (-18.847302214, 0, 0),
        (-13.841891722, -5.021244216, 0),
        (-10.778192574, -6.571724675, 0),
        (-9.771037873, -6.6, 0),
        (-9, 0, 0),
        (-9.771037873, 6.6, 0),
        (-10.778192574, 6.571724675, 0),
        (-13.841891722, 5.021244216, 0),
        (-7.271037873, 11.6, 0),
        (7.271037873, -11.6, 0),
        (19.748995796, 7.597887507, 0),
        (28.8, 0, 0),
    ]]
    chamfer(chamfer_1_edges, length=CHAMFER_1_SIZE)

    # ｽｹｯﾁ8 → ｶｯﾄ - 押し出し5 (cut)
    with BuildSketch(Plane.XY.offset(5.6)):
        Rectangle(SKETCH_8_W, SKETCH_8_H)
    extrude(amount=-CUT_EXTRUDE_5_DEPTH, mode=Mode.SUBTRACT)

    # ﾌｨﾚｯﾄ3
    fillet_3_edges = [part.edges().sort_by_distance(p)[0] for p in [
        (-6, -9, 3.6),
        (-6, 9, 3.6),
        (6, 9, 3.6),
        (6, -9, 3.6),
    ]]
    fillet(fillet_3_edges, radius=FILLET_3_R)

    # ﾌｨﾚｯﾄ4
    fillet_4_edges = [part.edges().sort_by_distance(p)[0] for p in [
        (4, 0, -7.2),
        (-4, 0, -7.2),
        (-4, 11.6, -1.2),
        (-4, -11.6, -1.2),
        (-4, 10.545584412, -6.145584412),
        (-4, -10.545584412, -6.145584412),
        (4, -11.6, -1.2),
        (4, 11.6, -1.2),
        (4, 10.545584412, -6.145584412),
        (4, -10.545584412, -6.145584412),
    ]]
    fillet(fillet_4_edges, radius=FILLET_4_R)


with BuildPart() as body_2:
    # ｽｹｯﾁ9 → ﾎﾞｽ - 押し出し3 (new body)
    with BuildSketch(Plane(origin=(4, 0, 0), x_dir=(0, 0, -1), z_dir=(1, 0, 0))):
        with Locations((4.45, 0)):
            Rectangle(SKETCH_9_W, SKETCH_9_H)
    extrude(amount=-EXTRUDE_3_DEPTH)


solid = Compound([part.part, body_2.part])
